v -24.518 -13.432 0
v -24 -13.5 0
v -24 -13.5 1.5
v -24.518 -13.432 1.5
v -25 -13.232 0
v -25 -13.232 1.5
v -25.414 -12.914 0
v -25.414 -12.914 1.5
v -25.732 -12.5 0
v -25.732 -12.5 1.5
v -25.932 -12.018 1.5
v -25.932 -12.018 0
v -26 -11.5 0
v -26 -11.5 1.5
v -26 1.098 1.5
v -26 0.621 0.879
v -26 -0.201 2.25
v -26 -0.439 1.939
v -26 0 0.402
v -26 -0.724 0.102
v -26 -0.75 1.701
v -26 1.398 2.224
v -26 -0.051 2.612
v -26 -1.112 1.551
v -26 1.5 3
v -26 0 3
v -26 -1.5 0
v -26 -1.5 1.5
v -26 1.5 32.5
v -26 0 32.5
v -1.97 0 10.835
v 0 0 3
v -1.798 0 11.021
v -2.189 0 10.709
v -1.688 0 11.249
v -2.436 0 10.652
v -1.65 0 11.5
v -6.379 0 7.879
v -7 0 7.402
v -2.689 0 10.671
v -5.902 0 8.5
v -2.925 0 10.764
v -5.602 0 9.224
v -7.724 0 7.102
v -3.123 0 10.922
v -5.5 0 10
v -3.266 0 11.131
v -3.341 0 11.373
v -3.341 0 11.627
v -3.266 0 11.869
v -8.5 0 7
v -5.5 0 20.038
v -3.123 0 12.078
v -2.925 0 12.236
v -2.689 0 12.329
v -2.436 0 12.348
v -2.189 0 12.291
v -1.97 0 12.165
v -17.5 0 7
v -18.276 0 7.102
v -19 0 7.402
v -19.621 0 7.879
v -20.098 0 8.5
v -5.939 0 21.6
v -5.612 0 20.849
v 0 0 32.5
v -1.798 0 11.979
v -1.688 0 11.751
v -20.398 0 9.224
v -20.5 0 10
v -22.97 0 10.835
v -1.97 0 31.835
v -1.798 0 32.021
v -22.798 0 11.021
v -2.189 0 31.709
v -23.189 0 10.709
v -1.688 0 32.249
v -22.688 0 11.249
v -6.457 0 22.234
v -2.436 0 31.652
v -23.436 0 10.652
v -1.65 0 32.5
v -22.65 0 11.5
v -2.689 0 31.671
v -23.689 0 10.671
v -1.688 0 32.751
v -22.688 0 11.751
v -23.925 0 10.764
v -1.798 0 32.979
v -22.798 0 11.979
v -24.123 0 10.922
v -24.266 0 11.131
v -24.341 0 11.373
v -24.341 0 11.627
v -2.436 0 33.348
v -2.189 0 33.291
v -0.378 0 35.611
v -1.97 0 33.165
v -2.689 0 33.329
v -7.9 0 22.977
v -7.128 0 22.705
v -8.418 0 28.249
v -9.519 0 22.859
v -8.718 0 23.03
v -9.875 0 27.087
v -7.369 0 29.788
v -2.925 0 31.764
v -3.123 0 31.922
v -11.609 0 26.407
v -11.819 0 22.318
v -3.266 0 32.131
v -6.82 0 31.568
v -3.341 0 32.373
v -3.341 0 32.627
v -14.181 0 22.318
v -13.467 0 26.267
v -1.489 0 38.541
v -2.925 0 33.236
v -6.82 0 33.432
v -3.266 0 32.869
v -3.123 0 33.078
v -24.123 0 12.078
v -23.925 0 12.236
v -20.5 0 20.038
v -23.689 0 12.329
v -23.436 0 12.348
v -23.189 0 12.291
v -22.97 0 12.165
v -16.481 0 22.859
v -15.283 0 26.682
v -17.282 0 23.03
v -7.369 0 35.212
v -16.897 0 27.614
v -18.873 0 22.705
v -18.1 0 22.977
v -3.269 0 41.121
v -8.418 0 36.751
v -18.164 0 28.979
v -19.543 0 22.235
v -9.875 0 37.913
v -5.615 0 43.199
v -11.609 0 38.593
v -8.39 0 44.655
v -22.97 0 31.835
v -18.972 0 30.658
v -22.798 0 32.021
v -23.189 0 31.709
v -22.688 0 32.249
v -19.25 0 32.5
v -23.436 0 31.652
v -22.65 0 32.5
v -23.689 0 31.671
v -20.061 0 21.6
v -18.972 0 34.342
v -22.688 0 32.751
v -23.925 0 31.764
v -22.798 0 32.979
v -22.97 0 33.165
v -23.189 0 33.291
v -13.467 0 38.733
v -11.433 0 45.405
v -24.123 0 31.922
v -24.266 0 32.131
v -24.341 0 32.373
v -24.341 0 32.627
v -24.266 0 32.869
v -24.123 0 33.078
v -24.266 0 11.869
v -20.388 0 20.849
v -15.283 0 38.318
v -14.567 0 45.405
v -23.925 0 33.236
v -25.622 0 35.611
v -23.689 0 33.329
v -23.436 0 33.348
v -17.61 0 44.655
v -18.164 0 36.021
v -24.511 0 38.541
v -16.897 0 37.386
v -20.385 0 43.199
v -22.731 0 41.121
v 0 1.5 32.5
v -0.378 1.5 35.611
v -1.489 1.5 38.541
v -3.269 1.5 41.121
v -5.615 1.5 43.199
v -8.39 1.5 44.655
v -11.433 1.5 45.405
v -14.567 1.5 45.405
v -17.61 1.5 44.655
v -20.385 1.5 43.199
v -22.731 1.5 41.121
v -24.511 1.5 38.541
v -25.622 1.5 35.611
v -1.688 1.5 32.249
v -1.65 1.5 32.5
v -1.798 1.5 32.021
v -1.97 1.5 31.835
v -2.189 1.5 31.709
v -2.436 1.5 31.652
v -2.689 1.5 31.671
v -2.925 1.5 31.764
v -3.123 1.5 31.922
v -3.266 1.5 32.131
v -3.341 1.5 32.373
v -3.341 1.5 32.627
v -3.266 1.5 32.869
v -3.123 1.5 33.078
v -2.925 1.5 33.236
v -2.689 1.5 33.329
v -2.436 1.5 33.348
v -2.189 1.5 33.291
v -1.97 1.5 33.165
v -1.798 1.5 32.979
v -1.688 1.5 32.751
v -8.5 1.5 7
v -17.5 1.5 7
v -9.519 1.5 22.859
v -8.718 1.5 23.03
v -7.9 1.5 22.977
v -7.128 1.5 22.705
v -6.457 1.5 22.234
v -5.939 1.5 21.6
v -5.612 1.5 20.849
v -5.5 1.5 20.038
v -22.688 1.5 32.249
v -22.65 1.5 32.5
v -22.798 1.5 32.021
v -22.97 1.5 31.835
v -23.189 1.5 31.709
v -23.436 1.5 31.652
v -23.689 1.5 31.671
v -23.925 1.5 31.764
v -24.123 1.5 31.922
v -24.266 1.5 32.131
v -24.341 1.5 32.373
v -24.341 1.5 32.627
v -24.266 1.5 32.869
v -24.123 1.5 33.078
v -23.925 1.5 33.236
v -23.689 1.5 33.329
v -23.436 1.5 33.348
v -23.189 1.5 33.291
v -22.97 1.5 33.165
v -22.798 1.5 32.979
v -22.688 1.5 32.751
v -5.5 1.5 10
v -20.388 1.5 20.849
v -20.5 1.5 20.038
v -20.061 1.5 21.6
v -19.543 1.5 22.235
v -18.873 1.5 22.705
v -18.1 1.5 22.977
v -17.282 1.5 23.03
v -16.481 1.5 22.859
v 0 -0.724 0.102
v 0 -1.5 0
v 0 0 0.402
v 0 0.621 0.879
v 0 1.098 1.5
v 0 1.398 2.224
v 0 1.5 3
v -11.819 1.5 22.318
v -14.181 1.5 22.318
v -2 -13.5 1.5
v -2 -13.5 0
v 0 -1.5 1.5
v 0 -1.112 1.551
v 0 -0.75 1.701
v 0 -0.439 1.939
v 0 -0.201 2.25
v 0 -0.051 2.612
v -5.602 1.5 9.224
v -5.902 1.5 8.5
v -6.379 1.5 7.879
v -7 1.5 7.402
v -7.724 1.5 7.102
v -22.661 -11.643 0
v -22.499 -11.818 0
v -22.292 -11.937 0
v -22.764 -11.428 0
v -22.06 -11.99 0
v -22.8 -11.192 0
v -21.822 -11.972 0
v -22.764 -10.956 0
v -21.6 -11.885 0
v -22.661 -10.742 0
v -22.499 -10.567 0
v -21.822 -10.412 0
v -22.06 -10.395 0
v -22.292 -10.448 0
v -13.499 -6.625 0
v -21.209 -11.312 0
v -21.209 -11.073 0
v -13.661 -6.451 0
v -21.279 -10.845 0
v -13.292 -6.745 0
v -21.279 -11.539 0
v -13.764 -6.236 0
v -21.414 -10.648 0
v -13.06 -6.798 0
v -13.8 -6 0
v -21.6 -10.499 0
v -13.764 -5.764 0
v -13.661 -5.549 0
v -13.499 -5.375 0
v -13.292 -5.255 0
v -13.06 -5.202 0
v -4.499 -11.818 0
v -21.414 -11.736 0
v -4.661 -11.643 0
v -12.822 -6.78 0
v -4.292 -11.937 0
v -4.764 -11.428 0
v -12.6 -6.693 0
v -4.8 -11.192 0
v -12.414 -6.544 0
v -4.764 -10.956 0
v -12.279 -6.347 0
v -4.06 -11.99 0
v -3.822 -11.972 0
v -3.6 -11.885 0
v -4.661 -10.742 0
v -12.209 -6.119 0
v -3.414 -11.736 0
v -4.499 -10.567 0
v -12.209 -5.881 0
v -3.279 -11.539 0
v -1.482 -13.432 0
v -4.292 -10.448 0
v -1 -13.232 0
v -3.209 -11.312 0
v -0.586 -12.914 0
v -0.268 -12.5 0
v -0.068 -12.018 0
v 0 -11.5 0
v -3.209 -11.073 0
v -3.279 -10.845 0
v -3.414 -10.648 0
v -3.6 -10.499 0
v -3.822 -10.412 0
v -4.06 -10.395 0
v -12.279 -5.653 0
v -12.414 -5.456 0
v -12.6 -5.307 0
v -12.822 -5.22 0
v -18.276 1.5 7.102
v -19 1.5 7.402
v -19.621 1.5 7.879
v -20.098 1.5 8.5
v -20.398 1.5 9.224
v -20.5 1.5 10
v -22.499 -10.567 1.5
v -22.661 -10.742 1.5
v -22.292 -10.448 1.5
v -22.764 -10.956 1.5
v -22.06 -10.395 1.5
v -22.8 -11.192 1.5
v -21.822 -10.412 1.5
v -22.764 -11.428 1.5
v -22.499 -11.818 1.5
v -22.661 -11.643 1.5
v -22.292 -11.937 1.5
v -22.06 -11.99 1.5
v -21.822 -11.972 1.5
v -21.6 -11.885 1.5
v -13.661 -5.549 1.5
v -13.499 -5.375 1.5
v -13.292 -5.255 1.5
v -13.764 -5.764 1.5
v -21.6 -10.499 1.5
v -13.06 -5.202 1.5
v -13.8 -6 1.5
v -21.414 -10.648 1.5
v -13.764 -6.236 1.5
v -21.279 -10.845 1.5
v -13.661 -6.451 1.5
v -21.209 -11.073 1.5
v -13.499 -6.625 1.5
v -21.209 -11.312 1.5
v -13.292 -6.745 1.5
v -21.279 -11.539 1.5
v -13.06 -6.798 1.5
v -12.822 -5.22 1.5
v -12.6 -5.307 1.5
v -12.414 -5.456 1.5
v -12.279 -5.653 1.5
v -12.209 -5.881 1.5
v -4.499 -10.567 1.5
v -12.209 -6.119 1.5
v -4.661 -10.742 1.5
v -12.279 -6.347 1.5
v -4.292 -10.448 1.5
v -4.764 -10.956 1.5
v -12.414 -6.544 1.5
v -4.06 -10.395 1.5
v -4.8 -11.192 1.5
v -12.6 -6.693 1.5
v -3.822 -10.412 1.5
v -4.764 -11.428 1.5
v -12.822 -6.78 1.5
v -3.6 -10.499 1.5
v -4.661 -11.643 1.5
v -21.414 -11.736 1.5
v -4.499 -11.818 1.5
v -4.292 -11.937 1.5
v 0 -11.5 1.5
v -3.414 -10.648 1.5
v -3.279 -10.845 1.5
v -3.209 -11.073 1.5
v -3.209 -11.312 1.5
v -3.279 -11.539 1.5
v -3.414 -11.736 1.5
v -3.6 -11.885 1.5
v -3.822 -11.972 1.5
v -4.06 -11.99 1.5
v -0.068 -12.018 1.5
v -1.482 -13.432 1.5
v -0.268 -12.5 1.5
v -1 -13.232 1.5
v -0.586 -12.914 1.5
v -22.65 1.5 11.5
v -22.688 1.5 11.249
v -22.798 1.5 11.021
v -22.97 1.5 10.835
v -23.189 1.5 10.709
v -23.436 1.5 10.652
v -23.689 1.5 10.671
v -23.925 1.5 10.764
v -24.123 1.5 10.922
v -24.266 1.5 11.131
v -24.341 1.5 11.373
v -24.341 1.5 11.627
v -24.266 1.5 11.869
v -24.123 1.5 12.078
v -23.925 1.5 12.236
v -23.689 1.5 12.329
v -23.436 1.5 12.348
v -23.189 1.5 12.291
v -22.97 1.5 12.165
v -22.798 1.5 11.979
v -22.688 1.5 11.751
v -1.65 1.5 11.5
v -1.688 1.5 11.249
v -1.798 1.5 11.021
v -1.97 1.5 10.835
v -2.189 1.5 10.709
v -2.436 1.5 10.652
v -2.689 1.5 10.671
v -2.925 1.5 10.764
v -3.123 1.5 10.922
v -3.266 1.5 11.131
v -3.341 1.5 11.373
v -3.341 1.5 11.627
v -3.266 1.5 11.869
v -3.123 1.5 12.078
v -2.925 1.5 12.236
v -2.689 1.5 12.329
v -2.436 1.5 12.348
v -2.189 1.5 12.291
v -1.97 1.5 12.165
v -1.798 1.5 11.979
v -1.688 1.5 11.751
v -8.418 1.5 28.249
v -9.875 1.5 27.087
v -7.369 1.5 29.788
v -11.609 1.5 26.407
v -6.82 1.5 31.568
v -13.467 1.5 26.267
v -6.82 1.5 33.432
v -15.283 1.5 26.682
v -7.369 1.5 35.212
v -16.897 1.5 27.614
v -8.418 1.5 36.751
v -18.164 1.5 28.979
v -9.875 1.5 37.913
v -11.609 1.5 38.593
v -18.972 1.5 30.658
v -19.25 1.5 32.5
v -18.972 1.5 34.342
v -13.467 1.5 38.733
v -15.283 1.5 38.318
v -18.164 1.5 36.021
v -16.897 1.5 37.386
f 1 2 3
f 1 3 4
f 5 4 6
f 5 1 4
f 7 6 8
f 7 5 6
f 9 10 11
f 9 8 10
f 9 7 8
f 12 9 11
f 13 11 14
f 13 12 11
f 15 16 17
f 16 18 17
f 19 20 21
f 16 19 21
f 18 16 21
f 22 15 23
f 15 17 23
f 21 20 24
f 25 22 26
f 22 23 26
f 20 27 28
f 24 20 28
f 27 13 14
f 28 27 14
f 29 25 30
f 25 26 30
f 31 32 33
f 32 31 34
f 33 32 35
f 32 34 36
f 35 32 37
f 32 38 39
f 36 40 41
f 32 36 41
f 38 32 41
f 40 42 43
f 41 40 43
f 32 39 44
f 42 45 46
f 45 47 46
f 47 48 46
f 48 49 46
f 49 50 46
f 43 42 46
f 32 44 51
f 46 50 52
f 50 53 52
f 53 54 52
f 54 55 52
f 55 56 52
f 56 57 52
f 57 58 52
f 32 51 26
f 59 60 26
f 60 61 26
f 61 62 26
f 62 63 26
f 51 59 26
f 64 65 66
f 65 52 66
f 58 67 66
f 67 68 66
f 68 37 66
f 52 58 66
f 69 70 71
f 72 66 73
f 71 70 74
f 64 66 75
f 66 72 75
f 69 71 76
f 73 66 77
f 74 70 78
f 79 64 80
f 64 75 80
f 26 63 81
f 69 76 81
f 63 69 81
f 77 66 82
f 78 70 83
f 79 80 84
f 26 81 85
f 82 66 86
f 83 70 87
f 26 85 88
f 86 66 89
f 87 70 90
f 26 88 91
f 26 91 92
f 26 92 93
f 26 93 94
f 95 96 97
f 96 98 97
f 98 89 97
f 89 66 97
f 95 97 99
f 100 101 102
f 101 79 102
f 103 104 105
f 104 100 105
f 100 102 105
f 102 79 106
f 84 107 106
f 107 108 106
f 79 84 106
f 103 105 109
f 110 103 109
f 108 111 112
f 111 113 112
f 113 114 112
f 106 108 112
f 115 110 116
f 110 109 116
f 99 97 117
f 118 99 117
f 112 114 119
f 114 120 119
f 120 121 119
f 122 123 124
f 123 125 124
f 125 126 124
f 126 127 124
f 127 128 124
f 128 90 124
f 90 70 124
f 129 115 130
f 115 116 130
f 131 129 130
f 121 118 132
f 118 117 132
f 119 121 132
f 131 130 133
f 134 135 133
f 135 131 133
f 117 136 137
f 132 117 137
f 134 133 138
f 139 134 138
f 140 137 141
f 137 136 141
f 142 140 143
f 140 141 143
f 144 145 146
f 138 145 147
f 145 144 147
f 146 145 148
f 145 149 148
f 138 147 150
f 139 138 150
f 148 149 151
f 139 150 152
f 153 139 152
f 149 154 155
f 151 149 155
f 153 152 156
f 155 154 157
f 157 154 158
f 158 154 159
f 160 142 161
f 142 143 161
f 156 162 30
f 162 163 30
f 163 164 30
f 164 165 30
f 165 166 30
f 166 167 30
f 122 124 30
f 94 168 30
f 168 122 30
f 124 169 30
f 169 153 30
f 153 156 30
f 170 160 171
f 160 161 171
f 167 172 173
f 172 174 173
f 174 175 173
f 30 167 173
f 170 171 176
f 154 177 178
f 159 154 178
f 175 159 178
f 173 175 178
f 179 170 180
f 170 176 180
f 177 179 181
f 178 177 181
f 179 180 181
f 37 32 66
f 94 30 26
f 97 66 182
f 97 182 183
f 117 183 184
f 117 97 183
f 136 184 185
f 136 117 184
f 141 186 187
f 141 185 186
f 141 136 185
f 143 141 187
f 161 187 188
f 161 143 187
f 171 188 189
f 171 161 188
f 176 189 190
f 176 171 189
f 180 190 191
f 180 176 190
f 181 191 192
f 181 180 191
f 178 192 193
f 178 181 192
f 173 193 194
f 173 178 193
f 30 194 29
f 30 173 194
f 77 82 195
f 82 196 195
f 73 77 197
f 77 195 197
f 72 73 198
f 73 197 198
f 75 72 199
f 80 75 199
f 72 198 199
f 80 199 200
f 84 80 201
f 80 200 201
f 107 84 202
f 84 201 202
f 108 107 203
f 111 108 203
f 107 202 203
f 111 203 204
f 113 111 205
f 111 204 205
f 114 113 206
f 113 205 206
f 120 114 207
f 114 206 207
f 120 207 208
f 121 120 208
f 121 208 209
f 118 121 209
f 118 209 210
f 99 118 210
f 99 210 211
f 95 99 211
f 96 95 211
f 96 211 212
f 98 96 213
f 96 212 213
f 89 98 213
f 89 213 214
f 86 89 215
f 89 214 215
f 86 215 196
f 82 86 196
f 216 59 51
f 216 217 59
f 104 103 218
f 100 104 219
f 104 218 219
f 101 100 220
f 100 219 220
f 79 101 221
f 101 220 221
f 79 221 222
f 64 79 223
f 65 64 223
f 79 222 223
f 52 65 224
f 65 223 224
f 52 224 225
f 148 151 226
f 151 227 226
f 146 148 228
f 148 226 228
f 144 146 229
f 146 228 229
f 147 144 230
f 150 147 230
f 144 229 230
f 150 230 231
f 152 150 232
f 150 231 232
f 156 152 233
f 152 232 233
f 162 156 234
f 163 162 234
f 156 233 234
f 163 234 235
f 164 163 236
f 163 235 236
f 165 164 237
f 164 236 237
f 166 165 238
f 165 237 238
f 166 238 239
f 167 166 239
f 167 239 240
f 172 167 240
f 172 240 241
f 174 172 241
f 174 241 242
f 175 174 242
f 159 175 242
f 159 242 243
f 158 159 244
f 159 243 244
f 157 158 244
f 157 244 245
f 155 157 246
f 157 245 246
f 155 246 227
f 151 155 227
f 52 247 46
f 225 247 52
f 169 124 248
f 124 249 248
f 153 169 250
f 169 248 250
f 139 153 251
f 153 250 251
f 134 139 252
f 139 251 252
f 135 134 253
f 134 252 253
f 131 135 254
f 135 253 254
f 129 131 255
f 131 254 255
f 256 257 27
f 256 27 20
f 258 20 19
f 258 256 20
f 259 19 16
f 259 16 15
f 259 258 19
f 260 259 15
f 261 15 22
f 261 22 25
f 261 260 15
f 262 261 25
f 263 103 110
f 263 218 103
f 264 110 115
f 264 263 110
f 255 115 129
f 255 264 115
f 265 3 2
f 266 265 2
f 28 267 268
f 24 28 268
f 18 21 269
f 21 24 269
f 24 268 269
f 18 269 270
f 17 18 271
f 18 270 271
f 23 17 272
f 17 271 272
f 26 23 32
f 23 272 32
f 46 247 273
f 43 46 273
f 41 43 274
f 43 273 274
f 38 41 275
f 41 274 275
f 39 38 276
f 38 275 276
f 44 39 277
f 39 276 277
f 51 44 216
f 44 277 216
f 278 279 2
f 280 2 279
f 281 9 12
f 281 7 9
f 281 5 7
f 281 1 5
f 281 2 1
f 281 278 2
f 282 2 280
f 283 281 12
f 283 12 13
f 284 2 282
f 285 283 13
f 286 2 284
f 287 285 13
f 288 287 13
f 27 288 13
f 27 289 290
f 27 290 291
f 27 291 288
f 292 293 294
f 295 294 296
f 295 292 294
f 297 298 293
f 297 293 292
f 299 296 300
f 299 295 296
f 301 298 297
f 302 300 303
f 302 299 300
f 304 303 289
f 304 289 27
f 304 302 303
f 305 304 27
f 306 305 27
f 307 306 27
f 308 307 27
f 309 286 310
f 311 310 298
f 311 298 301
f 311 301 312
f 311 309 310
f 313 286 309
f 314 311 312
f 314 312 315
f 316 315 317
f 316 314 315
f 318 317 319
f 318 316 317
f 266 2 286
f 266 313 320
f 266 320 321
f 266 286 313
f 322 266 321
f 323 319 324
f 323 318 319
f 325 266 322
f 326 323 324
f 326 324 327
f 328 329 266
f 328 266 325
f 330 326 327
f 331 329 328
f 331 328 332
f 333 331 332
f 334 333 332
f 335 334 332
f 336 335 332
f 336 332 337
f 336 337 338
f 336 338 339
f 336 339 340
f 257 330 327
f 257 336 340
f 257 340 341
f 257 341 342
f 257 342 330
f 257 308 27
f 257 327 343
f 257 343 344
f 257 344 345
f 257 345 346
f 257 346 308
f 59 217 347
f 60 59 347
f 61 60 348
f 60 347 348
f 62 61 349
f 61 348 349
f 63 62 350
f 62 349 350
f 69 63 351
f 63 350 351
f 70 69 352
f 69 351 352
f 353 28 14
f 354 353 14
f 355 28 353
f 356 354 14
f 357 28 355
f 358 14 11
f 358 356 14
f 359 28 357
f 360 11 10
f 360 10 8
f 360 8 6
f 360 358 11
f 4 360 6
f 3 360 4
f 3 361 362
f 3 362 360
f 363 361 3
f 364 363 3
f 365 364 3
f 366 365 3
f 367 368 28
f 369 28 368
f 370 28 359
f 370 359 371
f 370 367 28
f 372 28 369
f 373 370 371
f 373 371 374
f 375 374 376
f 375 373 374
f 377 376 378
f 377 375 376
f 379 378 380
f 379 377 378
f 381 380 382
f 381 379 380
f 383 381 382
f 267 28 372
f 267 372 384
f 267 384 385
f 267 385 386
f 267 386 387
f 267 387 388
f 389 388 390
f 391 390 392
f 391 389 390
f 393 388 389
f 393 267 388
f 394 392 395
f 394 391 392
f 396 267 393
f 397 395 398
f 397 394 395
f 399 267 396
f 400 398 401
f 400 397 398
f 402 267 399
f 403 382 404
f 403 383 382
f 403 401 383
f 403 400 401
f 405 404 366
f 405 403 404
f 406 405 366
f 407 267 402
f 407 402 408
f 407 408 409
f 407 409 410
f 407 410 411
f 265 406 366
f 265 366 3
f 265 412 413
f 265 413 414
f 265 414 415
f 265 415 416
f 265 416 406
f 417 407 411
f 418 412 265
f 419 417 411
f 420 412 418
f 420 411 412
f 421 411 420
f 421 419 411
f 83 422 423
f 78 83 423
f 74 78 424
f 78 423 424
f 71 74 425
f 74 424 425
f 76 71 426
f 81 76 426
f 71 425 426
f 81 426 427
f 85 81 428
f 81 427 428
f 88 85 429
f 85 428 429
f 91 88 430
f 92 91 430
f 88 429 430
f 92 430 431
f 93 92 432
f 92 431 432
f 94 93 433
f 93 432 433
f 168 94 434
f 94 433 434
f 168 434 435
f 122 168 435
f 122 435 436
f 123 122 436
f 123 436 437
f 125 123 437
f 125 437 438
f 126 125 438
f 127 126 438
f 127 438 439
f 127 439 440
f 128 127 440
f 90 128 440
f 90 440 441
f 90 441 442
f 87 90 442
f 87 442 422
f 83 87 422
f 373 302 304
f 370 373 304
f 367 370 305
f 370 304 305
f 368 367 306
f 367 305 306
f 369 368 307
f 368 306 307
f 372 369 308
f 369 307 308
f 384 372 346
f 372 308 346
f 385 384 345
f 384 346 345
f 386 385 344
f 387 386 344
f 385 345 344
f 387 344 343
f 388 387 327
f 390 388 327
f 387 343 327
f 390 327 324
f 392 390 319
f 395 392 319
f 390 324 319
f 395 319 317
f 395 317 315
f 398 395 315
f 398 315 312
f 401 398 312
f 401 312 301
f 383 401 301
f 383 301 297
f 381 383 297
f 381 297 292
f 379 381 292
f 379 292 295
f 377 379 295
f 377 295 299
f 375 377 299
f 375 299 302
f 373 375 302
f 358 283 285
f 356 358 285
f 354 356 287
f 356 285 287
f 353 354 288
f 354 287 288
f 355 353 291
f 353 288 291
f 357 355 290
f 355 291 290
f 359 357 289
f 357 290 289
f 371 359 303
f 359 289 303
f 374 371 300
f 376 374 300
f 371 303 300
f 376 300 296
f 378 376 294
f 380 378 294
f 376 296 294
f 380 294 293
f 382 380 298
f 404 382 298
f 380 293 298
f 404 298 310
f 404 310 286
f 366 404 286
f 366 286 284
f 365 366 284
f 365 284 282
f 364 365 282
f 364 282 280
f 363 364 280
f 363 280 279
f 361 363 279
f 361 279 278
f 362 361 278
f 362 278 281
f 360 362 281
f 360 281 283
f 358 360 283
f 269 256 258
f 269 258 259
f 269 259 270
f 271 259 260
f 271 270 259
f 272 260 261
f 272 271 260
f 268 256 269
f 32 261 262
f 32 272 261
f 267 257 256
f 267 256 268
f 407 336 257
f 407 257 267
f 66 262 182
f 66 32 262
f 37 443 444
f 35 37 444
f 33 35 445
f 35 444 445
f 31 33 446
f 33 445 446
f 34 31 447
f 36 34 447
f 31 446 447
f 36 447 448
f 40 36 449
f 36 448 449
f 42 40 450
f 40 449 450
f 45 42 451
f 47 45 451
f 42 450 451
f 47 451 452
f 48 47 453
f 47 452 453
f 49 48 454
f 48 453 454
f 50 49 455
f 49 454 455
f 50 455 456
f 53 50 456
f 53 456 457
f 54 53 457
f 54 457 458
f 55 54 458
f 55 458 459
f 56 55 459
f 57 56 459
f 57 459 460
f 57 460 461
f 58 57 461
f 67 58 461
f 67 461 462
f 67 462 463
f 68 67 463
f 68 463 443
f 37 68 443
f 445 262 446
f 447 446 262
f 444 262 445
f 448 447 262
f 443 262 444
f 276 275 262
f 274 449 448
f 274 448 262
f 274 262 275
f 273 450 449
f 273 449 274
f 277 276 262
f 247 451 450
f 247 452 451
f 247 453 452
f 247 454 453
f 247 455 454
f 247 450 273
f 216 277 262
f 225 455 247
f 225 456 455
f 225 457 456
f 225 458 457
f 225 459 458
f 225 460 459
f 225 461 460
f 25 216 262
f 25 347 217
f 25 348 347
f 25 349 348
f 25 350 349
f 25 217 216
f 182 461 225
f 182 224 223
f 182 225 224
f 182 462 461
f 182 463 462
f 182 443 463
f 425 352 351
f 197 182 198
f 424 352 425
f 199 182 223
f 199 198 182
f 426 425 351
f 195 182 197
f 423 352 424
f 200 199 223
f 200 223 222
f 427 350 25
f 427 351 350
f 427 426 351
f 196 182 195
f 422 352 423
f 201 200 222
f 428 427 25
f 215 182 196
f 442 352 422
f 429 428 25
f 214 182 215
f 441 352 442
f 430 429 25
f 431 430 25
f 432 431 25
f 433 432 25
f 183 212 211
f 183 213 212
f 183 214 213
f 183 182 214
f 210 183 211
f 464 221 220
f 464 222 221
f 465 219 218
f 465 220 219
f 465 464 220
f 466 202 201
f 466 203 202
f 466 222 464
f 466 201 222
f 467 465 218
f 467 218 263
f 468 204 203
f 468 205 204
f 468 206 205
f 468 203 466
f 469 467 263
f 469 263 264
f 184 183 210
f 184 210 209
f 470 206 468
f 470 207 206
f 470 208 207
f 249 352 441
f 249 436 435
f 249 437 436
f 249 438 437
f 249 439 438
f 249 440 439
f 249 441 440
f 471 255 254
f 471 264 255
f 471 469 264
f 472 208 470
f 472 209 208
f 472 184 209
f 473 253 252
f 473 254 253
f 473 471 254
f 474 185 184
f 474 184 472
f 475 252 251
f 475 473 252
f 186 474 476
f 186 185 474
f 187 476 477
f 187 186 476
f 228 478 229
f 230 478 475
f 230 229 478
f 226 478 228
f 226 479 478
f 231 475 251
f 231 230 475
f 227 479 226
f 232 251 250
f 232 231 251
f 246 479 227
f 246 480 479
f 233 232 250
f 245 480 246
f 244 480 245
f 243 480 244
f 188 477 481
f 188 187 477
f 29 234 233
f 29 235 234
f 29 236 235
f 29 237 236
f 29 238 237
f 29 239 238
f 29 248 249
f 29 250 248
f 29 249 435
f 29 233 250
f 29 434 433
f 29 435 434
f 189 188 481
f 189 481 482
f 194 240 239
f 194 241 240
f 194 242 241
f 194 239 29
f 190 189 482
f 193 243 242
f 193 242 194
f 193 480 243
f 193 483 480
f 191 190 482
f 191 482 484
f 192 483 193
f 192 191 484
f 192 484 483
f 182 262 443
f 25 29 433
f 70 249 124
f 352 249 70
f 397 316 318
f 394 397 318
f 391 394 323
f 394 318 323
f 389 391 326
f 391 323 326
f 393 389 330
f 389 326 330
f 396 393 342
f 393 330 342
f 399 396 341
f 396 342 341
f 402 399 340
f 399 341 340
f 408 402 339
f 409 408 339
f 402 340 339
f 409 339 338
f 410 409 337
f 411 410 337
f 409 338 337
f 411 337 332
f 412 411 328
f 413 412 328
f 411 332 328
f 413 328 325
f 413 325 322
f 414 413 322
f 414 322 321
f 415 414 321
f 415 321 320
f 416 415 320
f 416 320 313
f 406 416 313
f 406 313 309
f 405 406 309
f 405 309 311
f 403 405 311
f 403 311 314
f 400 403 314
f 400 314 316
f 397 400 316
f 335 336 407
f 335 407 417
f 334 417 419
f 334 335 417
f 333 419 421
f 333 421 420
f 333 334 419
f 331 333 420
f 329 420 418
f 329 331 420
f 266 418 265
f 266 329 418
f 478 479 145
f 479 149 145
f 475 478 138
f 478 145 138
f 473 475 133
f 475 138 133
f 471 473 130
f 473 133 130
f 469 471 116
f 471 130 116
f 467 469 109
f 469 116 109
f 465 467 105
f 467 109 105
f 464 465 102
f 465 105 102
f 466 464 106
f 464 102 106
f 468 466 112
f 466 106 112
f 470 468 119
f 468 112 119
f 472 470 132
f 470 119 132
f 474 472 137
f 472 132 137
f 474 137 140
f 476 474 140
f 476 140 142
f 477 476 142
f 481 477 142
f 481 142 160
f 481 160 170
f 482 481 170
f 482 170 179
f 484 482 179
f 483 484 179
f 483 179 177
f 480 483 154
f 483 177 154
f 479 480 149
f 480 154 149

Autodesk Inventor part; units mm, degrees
ref_plane "YZ Plane" through (0, 0, 0) normal (1, 0, 0) x (0, 1, 0)
ref_plane "XZ Plane" through (0, 0, 0) normal (0, 1, 0) x (-1, 0, 0)
ref_plane "XY Plane" through (0, 0, 0) normal (0, 0, 1) x (1, 0, 0)
sketch "スケッチ1" plane through (0, 0, 0) normal (0, 1, 0) x (-1, 0, 0)
  line L0 (26, 0) -> (0, 0)
  line L1 (0, 0) -> (0, -89.5474)
  line L2 (0, -89.5474) -> (26, -89.5474)
  line L3 (26, -89.5474) -> (26, 0)
  line L4 (26, 0) -> (0, 0)
  line L5 (0, 0) -> (0, 70)
  line L6 (0, 70) -> (26, 70)
  line L7 (26, 70) -> (26, 0)
  line L8 (26, 32.5) -> (0, 32.5)
  circle A0 centre (13, 32.5) radius 6.25
  circle A1 centre (13, 32.5) radius 13
  point P0 (26, 32.5)
  point P1 (0, 32.5)
  dimension "d2" = 70
  dimension "d3" = 26
  dimension "d4" = 32.5
  dimension "d5" = 12.5
extrude "プレート1" add sketch "スケッチ1" along normal blind 1.5 contours L0 L5 A1 L7 | A1 L8 A0 | L8 A0 A1
sketch "スケッチ3" plane through (0, 1.5, 0) normal (0, 1, 0) x (1, 0, 0)
  circle A0 centre (-23.5, -32.5) radius 0.85 projected
  circle A1 centre (-23.5, -11.5) radius 0.85 projected
  circle A2 centre (-2.5, -11.5) radius 0.85 projected
  circle A3 centre (-2.5, -32.5) radius 0.85 projected
  point P0 (0, 0)
extrude "切り取り1" cut sketch "スケッチ3" against normal blind 1.5
sketch "スケッチ4" plane through (0, 1.5, 1.5) normal (0, 0, -1) x (-1, 0, 0)
  line L0 (26, 0) -> (0, 0)
  line L1 (0, 0) -> (0, -15)
  line L2 (0, -15) -> (26, -15)
  line L3 (26, -15) -> (26, 0)
edge flange "フランジ2" height 15 angle 90 thickness 1.5 bend radius 1.5 thickness toward (0, 0, -1) relief tear relief width 1.5 relief depth 0.75 edges at (-13, 0, 0) wall of the first edge with corners at (-26, 1.5, 1.5) (0, 1.5, 1.5) (0, -13.5, 1.5) (-26, -13.5, 1.5)
bend "曲げ2"
corner "コーナー2"
sketch "スケッチ5" plane through (0, -13.5, 0) normal (0, 0, -1) x (-1, 0, 0)
  line L0 (0, 0) -> (26, 0)
  line L1 (26, 0) -> (26, 15)
  line L2 (26, 15) -> (0, 15)
  line L3 (0, 15) -> (0, 0)
  line L4 (26, 12) -> (26, 0) projected
  line L5 (0, 0) -> (0, 12) projected
  line L6 (0, 15) -> (26, 0)
  line L7 (26, 15) -> (0, 0)
  line L8 (4, 12.6923) -> (22, 12.6923)
  line L9 (22, 12.6923) -> (22, 2.3077)
  line L10 (22, 2.3077) -> (4, 2.3077)
  line L11 (4, 2.3077) -> (4, 12.6923)
  circle A0 centre (4, 12.6923) radius 0.8
  circle A1 centre (22, 12.6923) radius 0.8
  circle A2 centre (4, 2.3077) radius 0.8
  circle A3 centre (22, 2.3077) radius 0.8
  circle A4 centre (13, 7.5) radius 0.8
  point P0 (0, 13.5)
  dimension "d35" = 15
  dimension "d36" = 4
  dimension "d37" = 1.6
  dimension "d38" = 1.6
  dimension "d39" = 1.6
  dimension "d40" = 1.6
  dimension "d43" = 1.6
extrude "切り取り3" cut sketch "スケッチ5" against normal blind 1.5 contours A2 L11 L7 | L7 L10 A2 | A3 L10 L6 | L6 L9 A3 | L11 A2 L7 | L7 A2 L10 | L10 A3 L6 | L6 A3 L9 | A4 L6 L7 | L7 L6 A4 | L6 L7 A4 | L6 A4 L7
sketch "スケッチ6" plane through (0, 1.5, 0) normal (0, 1, 0) x (1, 0, 0)
  circle A0 centre (-2.5, -32.5) radius 0.85 projected
  circle A1 centre (-23.5, -32.5) radius 0.85 projected
  circle A2 centre (-23.5, -11.5) radius 0.85 projected
  circle A3 centre (-2.5, -11.5) radius 0.85 projected
  line L0 (-2.5, -32.5) -> (-23.5, -32.5)
  line L1 (-23.5, -32.5) -> (-23.5, -11.5)
  line L2 (-23.5, -11.5) -> (-2.5, -11.5)
  line L3 (-2.5, -11.5) -> (-2.5, -32.5)
  line L4 (-5.5, -32.5) -> (-20.5, -32.5)
  line L5 (-20.5, -20.0376) -> (-20.5, -10)
  line L6 (-17.5, -7) -> (-8.5, -7)
  line L7 (-5.5, -10) -> (-5.5, -20.0376)
  circle A4 centre (-13, -32.5) radius 6.25 projected
  line L8 (0, -3) -> (-26, -3) projected
  arc A5 (-9.5189, -22.8592) -> (-16.4811, -22.8592) centre (-13, -32.5) ccw
  arc A6 (-23.2186, -31.6979) -> (-23.2186, -33.3021) centre (-13, -32.5) ccw
  arc A7 (-2.7814, -33.3021) -> (-2.7814, -31.6979) centre (-13, -32.5) ccw
  arc A8 (-9.5189, -22.8592) -> (-5.5, -20.0376) centre (-8.5, -20.0376) ccw
  arc A9 (-20.5, -20.0376) -> (-16.4811, -22.8592) centre (-17.5, -20.0376) ccw
  arc A10 (-5.5, -10) -> (-8.5, -7) centre (-8.5, -10) ccw
  arc A11 (-17.5, -7) -> (-20.5, -10) centre (-17.5, -10) ccw
  point P0 (0, 0)
  point P1 (-20.5, -7)
  point P2 (-5.5, -7)
  point P3 (-5.5, -25.5134)
  point P4 (-20.5, -25.5134)
  dimension "d46" = 3
  dimension "d47" = 3
  dimension "d49" = 4
  dimension "d50" = 4
  dimension "d53" = 3
  dimension "d54" = 3
extrude "切り取り4" cut sketch "スケッチ6" against normal blind 1.5 contours L7 A8 A5 A9 L5 L2 | L2 L5 A11 L6 A10 L7
fillet "フィレット1" radius 2 2 edges at (-26, -13.5, 0.75) (0, -13.5, 0.75)
equation "\"d23\" = Thickness"
equation "\"d44\" = Thickness"
equation "\"d51\" = Thickness"
equation "\"d12\" = Thickness"
equation "\"d25\" = BendReliefWidth"
equation "\"d26\" = BendReliefDepth"
equation "\"d27\" = MinimumRemnant"
equation "\"d28\" = TransitionRadius"
equation "\"d31\" = BendRadius"
equation "\"d32\" = CornerReliefSize"
equation "\"d33\" = GapSize"
equation "\"d34\" = JacobiRadiusSize"
equation "\"BendRadius\" = Thickness"
equation "\"BendReliefWidth\" = Thickness"
equation "\"BendReliefDepth\" = 0.5 * Thickness"
equation "\"CornerReliefSize\" = 4 * Thickness"
equation "\"MinimumRemnant\" = 2 * Thickness"
equation "\"TransitionRadius\" = BendRadius"
equation "\"JacobiRadiusSize\" = BendRadius"
equation "\"GapSize\" = Thickness"
equation "\"Thickness\" = 1.5"
properties part number "toe_front" material "アルミニウム 6061"
